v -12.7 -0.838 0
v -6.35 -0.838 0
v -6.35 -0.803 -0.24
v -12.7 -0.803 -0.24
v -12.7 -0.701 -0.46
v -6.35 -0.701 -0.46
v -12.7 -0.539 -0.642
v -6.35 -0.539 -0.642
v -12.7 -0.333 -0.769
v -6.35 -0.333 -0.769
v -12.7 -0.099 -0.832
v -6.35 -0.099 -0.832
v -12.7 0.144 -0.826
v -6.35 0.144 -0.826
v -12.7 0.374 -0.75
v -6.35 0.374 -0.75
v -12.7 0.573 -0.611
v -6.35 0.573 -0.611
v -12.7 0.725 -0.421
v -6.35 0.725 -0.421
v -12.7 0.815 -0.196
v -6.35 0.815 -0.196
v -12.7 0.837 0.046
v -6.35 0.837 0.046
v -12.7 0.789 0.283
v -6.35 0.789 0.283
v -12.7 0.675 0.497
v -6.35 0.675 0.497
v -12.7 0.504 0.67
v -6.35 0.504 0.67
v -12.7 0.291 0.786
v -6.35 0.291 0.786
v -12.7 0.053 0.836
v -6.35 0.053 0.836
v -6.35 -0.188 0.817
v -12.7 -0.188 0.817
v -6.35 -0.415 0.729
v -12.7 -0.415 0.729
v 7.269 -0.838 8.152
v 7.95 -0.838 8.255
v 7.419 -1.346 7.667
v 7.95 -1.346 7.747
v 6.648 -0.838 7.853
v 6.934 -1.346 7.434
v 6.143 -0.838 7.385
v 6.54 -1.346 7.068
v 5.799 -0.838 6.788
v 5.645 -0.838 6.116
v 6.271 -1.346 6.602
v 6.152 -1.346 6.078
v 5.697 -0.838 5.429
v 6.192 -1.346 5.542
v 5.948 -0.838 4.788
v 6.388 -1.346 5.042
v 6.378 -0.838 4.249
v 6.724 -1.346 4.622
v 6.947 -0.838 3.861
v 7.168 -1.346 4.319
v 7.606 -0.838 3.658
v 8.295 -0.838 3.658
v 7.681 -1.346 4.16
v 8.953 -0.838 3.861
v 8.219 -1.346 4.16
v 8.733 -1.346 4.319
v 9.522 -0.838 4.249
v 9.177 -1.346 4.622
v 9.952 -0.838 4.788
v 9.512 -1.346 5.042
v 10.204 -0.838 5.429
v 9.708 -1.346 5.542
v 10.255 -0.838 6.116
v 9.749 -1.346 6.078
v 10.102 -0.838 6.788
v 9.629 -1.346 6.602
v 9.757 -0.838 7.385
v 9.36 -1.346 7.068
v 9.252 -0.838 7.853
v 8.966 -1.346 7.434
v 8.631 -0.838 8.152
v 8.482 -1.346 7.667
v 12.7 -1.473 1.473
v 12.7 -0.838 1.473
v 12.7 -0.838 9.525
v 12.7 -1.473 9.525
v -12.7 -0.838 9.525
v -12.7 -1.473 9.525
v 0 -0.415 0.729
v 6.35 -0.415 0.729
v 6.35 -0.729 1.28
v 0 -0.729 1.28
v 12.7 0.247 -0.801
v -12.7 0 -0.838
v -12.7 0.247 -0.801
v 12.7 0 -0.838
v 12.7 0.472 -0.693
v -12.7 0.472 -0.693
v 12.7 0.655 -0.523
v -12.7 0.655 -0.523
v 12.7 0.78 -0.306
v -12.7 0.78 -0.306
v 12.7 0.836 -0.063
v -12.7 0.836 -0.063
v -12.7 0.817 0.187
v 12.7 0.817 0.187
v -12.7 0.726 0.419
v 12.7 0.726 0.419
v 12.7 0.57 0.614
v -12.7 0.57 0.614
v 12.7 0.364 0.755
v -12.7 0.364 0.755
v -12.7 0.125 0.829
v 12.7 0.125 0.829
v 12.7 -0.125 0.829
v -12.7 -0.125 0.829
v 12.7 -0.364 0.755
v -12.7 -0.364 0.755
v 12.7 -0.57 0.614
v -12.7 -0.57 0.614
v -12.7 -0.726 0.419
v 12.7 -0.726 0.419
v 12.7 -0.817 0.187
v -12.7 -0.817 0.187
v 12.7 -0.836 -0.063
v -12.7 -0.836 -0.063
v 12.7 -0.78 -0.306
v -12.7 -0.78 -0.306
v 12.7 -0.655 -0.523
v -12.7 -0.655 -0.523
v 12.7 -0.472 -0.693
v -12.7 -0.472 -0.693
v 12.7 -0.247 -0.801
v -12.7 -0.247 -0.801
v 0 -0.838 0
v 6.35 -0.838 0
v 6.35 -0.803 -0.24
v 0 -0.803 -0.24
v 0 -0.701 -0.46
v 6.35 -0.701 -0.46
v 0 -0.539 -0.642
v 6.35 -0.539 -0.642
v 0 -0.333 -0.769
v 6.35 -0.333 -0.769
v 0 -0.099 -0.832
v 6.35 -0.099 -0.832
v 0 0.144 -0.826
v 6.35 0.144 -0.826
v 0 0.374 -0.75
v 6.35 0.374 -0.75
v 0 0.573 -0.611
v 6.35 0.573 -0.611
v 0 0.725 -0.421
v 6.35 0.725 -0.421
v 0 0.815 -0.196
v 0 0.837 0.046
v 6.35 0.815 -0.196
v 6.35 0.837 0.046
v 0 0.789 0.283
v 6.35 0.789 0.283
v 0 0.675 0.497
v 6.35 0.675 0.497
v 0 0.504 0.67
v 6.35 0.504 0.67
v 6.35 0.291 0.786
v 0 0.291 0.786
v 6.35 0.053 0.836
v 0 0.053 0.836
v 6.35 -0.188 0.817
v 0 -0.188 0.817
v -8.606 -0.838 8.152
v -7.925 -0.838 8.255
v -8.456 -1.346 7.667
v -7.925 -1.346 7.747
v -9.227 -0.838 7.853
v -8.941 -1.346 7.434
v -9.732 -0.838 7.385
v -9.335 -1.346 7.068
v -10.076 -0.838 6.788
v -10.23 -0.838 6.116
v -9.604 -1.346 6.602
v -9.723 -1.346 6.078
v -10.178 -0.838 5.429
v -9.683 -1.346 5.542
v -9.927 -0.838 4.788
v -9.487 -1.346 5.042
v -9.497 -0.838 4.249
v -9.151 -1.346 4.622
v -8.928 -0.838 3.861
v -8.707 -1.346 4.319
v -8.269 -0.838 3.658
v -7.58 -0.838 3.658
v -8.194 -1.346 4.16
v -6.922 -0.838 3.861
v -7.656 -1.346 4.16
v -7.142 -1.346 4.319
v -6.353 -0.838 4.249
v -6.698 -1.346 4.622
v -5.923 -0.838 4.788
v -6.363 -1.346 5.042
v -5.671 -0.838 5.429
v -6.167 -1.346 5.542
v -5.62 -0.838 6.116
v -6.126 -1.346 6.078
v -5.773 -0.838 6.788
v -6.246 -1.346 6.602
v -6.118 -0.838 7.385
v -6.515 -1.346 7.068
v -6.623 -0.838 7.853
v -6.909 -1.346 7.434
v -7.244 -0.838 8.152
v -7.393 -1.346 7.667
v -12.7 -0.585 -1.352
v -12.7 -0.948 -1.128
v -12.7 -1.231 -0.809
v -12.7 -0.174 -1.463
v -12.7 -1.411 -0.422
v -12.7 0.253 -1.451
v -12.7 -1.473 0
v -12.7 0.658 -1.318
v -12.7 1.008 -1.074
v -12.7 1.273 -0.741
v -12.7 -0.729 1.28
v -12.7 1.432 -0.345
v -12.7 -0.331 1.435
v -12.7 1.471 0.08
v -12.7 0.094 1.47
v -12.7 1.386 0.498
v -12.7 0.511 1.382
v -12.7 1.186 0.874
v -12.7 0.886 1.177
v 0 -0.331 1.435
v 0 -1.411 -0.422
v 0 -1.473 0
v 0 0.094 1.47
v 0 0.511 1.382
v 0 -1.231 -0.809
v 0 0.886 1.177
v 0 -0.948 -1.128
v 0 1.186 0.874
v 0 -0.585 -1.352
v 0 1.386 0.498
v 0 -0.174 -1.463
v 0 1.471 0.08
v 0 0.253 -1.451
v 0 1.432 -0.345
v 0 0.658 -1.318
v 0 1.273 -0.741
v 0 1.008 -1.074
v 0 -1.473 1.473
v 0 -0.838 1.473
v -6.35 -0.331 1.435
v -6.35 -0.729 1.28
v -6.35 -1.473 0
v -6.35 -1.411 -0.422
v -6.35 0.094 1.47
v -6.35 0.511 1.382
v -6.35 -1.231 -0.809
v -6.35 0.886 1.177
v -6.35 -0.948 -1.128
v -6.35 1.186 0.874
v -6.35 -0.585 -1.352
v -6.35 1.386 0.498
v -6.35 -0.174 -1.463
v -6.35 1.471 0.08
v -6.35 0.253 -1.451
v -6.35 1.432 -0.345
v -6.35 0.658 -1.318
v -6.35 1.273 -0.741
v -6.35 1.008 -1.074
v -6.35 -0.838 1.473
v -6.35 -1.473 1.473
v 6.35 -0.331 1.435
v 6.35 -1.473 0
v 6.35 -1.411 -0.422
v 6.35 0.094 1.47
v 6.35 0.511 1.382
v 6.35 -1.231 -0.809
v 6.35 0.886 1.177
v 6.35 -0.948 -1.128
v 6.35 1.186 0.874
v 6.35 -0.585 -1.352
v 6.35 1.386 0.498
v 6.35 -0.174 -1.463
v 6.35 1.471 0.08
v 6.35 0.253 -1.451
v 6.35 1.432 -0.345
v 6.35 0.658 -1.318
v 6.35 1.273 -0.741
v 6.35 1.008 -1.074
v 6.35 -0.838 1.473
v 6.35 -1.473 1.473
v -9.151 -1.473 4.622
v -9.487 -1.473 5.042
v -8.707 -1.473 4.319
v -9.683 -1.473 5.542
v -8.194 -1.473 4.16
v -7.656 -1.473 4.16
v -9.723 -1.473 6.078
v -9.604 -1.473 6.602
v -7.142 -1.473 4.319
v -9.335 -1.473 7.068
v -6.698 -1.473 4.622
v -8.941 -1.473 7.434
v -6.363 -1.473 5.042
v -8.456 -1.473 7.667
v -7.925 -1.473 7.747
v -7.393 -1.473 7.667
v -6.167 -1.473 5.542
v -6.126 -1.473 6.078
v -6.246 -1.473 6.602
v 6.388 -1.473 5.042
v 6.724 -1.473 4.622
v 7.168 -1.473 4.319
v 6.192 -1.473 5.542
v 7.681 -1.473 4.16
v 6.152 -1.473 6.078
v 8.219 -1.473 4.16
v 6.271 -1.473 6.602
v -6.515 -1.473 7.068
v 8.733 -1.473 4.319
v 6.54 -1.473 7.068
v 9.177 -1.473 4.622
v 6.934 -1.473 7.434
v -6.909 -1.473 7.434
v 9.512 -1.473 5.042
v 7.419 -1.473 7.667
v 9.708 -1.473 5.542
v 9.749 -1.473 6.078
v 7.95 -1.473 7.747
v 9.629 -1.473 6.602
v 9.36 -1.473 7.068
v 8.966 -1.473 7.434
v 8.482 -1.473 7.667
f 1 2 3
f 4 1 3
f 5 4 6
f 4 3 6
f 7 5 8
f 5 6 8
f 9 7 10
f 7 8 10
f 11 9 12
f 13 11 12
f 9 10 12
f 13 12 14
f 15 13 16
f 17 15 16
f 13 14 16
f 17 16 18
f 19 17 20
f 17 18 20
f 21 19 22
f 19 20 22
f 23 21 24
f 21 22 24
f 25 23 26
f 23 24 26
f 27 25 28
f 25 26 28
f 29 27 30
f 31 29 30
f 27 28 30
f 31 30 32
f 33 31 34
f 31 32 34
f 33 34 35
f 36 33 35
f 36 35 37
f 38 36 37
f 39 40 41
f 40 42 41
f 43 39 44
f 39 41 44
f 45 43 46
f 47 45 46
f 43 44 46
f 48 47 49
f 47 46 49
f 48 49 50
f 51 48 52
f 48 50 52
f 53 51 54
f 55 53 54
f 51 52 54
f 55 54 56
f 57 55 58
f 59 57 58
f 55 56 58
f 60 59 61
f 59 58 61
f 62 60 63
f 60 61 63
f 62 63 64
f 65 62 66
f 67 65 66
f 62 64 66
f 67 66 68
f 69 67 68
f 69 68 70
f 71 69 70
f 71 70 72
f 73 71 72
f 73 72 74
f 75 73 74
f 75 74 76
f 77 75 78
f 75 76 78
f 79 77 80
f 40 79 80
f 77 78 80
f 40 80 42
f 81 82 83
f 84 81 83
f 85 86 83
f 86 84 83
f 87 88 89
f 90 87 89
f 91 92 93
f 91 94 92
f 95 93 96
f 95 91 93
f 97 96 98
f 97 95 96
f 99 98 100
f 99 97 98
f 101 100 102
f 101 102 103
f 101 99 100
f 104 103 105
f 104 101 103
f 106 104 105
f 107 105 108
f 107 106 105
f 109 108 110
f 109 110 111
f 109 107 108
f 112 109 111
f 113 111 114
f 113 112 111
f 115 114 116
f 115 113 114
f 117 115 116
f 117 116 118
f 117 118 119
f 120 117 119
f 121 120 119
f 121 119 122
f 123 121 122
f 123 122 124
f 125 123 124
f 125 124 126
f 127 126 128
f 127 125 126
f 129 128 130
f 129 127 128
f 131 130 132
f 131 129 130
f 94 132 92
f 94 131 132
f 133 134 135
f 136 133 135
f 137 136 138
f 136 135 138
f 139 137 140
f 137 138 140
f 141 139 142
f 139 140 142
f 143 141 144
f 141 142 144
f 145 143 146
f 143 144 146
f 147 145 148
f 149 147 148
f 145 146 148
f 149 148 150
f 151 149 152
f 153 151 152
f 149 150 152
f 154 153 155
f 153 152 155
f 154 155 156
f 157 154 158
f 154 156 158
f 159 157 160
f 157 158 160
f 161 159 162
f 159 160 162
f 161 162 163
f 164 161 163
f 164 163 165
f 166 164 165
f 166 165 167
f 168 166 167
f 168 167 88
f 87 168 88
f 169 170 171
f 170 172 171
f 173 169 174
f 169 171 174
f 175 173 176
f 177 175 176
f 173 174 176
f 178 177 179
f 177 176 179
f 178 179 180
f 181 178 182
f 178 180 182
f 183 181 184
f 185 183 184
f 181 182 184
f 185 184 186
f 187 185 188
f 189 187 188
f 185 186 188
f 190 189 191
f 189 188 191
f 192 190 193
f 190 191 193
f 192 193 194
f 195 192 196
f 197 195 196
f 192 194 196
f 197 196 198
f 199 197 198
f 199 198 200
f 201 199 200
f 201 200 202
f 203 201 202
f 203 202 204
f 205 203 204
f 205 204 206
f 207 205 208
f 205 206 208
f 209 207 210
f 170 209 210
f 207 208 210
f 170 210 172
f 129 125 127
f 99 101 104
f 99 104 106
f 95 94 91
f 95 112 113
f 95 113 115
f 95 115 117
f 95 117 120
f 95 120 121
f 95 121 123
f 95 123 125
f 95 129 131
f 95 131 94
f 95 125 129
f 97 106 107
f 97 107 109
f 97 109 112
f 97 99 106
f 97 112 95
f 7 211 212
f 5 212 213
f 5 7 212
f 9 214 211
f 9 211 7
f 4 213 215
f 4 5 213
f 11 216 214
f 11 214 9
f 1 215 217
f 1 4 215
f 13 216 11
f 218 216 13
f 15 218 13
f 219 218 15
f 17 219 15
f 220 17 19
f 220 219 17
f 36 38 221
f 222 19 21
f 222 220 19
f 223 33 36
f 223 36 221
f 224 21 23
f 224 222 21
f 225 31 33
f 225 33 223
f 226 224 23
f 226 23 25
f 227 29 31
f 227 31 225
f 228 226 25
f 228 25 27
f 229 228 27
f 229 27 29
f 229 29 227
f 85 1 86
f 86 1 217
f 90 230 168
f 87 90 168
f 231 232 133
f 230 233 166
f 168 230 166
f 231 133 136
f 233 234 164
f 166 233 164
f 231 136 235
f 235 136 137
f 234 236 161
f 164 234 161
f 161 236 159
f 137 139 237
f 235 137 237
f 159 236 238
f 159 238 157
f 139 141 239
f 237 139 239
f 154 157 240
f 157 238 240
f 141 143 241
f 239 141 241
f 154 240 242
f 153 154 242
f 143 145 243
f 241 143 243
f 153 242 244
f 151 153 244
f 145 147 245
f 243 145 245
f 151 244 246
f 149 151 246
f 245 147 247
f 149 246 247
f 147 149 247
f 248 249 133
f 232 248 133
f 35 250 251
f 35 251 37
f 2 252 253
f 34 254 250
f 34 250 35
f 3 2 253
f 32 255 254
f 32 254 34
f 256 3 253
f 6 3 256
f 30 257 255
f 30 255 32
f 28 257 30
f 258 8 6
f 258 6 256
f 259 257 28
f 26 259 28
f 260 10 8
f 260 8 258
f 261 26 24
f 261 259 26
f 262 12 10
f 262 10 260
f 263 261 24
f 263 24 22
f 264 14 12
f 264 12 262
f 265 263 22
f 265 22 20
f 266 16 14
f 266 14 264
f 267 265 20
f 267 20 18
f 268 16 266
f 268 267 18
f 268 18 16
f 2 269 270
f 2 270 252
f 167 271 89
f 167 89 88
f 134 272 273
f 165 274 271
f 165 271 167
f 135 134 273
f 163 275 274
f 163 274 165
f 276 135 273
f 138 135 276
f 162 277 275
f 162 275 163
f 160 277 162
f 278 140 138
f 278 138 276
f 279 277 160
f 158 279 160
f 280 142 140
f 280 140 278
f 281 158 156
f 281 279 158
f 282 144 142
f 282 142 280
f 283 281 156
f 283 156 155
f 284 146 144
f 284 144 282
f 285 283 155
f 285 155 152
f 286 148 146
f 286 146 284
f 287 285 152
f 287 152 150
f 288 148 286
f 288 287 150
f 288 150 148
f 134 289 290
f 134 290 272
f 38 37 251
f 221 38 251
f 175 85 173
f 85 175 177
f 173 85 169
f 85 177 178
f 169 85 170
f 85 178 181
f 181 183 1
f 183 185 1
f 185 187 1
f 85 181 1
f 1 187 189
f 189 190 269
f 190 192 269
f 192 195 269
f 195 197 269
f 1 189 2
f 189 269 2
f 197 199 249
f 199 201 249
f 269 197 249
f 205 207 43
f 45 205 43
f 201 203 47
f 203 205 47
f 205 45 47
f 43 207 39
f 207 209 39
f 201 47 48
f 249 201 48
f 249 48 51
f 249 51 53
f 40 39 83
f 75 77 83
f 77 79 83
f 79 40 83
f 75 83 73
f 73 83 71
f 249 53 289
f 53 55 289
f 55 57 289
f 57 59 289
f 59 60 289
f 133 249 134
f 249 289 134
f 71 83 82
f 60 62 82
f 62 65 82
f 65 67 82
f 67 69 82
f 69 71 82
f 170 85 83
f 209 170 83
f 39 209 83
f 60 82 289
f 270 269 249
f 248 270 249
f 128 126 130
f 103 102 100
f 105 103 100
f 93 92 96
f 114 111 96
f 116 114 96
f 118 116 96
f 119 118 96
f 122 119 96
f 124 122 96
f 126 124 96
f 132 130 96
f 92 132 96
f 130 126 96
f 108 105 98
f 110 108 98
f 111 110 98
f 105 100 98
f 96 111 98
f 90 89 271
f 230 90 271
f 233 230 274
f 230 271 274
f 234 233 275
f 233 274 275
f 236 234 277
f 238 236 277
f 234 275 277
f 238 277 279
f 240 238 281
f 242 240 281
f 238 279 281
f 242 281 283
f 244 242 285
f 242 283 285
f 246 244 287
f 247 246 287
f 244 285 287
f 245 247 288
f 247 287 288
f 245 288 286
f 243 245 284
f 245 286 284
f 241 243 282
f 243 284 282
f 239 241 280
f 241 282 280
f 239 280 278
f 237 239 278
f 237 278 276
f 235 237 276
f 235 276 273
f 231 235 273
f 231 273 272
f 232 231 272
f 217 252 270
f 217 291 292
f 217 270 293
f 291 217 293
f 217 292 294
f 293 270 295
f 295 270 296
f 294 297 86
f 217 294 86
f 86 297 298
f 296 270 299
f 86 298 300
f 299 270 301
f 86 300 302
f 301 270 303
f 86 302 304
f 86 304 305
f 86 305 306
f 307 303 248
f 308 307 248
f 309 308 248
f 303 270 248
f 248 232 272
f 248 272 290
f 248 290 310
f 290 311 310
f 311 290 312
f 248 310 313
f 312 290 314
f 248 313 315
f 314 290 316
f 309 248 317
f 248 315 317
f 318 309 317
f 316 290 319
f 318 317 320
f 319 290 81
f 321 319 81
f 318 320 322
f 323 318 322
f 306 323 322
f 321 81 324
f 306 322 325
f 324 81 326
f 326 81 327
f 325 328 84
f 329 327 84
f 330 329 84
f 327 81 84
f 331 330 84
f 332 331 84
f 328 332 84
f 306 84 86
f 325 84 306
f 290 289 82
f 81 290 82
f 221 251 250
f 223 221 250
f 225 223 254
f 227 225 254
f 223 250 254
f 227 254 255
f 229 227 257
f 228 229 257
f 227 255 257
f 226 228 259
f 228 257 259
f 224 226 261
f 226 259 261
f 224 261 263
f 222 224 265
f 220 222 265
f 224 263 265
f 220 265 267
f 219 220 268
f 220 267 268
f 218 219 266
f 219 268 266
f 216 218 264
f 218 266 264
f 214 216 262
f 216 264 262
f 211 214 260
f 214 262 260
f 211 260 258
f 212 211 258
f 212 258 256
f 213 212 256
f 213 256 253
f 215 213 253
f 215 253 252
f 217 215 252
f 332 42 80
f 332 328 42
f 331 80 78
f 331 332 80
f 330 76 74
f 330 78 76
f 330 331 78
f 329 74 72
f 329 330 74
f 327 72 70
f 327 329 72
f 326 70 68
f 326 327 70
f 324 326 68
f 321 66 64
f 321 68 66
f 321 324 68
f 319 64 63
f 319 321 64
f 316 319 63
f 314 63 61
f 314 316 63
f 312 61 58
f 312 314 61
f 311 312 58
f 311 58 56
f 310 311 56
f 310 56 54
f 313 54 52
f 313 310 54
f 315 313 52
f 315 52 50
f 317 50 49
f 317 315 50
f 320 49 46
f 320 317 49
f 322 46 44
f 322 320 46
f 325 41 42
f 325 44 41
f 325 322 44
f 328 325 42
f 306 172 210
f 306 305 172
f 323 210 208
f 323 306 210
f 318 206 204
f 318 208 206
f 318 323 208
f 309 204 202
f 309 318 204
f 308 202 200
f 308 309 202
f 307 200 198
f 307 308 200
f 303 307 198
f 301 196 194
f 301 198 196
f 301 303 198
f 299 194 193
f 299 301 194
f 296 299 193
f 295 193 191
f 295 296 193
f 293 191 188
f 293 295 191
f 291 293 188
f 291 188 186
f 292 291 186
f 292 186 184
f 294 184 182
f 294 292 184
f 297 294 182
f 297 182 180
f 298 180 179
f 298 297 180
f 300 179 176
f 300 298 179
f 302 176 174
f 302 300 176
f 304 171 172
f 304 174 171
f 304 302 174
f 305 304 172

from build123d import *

# Parameters (mm, degrees)
BOSS_EXTRUDE1_DEPTH     = 12.7
SKETCH4_W               = 6.35
SKETCH4_H               = 2.9464
CUT_EXTRUDE1_DEPTH      = 16.943209942
LPATTERN1_COUNT         = 6
LPATTERN1_PITCH         = 12.7
CUT_EXTRUDE3_DEPTH      = 16.943209942
CUT_EXTRUDE3_DEPTH_BACK = 16.943209942
SKETCH9_R               = 1.8034
SKETCH6_R               = 0.8382
BOSS_EXTRUDE2_DEPTH     = 12.7


with BuildPart() as part:
    # Sketch3 → Boss-Extrude1 (new, symmetric)
    with BuildSketch(Plane(origin=(0, 0, 0), x_dir=(0, 0, -1), z_dir=(1, 0, 0))):
        with BuildLine():
            Line((0, -1.4732), (-9.525, -1.4732))
            Line((-9.525, -1.4732), (-9.525, -0.8382))
            Line((-9.525, -0.8382), (0, -0.8382))
            ThreePointArc((0, -0.8382), (0.421388638, 0.724576328), (-0.728533124, -0.414510226))
            Line((-0.728533124, -0.414510226), (-1.280452157, -0.728533124))
            ThreePointArc((-1.280452157, -0.728533124), (0.740622455, 1.273497789), (0, -1.4732))
        make_face()
    extrude(amount=BOSS_EXTRUDE1_DEPTH, both=True)

    # Sketch4 → Cut-Extrude1 (cut, symmetric)
    with BuildSketch(Plane(origin=(0, 0, 0), x_dir=(1, 0, 0), z_dir=(0, 1, 0))):
        with Locations((-3.175, 0)):
            Rectangle(SKETCH4_W, SKETCH4_H)
    cut_extrude1 = extrude(amount=CUT_EXTRUDE1_DEPTH, both=True, mode=Mode.SUBTRACT)

    # LPattern1: Cut-Extrude1 ×6
    with Locations(*[(i * LPATTERN1_PITCH, 0, 0) for i in range(1, LPATTERN1_COUNT)]):
        add(cut_extrude1, mode=Mode.SUBTRACT)

    # Cut-Extrude2 cone 1 section (through the dimple's axis) → Cut-Extrude2 (revolve, cut)
    with BuildSketch(Plane(origin=(7.9502, -0.8382, 5.9436), x_dir=(0, 0, 1), z_dir=(1, 0, 0))):
        Polygon((0, 0), (2.3114, 0), (0, 2.3114), align=None)
    revolve(axis=Axis((7.9502, -0.8382, 5.9436), (0, -1, 0)), mode=Mode.SUBTRACT)

    # Cut-Extrude2 cone 2 section (through the dimple's axis) → Cut-Extrude2 cone 2 (revolve, cut)
    with BuildSketch(Plane(origin=(-7.9248, -0.8382, 5.9436), x_dir=(0, 0, 1), z_dir=(1, 0, 0))):
        Polygon((0, 0), (2.3114, 0), (0, 2.3114), align=None)
    revolve(axis=Axis((-7.9248, -0.8382, 5.9436), (0, -1, 0)), mode=Mode.SUBTRACT)

    # Sketch9 → Cut-Extrude3 (cut, two sides: drawn at the far end of the back side and taken through both)
    with BuildSketch(Plane(origin=(0, 0, 0), x_dir=(1, 0, 0), z_dir=(0, 1, 0)).offset(-CUT_EXTRUDE3_DEPTH_BACK)):
        with Locations(Location((7.9502, -5.9436, 0), (0, 0, 270))):
            Circle(SKETCH9_R)
        with Locations(Location((-7.9248, -5.9436, 0), (0, 0, 270))):
            Circle(SKETCH9_R)
    extrude(amount=CUT_EXTRUDE3_DEPTH + CUT_EXTRUDE3_DEPTH_BACK, mode=Mode.SUBTRACT)


with BuildPart() as body_2:
    # Sketch6 → Boss-Extrude2 (new, symmetric)
    with BuildSketch(Plane(origin=(0, 0, 0), x_dir=(0, 0, -1), z_dir=(1, 0, 0))):
        Circle(SKETCH6_R)
    extrude(amount=BOSS_EXTRUDE2_DEPTH, both=True)


solid = Compound([part.part, body_2.part])
